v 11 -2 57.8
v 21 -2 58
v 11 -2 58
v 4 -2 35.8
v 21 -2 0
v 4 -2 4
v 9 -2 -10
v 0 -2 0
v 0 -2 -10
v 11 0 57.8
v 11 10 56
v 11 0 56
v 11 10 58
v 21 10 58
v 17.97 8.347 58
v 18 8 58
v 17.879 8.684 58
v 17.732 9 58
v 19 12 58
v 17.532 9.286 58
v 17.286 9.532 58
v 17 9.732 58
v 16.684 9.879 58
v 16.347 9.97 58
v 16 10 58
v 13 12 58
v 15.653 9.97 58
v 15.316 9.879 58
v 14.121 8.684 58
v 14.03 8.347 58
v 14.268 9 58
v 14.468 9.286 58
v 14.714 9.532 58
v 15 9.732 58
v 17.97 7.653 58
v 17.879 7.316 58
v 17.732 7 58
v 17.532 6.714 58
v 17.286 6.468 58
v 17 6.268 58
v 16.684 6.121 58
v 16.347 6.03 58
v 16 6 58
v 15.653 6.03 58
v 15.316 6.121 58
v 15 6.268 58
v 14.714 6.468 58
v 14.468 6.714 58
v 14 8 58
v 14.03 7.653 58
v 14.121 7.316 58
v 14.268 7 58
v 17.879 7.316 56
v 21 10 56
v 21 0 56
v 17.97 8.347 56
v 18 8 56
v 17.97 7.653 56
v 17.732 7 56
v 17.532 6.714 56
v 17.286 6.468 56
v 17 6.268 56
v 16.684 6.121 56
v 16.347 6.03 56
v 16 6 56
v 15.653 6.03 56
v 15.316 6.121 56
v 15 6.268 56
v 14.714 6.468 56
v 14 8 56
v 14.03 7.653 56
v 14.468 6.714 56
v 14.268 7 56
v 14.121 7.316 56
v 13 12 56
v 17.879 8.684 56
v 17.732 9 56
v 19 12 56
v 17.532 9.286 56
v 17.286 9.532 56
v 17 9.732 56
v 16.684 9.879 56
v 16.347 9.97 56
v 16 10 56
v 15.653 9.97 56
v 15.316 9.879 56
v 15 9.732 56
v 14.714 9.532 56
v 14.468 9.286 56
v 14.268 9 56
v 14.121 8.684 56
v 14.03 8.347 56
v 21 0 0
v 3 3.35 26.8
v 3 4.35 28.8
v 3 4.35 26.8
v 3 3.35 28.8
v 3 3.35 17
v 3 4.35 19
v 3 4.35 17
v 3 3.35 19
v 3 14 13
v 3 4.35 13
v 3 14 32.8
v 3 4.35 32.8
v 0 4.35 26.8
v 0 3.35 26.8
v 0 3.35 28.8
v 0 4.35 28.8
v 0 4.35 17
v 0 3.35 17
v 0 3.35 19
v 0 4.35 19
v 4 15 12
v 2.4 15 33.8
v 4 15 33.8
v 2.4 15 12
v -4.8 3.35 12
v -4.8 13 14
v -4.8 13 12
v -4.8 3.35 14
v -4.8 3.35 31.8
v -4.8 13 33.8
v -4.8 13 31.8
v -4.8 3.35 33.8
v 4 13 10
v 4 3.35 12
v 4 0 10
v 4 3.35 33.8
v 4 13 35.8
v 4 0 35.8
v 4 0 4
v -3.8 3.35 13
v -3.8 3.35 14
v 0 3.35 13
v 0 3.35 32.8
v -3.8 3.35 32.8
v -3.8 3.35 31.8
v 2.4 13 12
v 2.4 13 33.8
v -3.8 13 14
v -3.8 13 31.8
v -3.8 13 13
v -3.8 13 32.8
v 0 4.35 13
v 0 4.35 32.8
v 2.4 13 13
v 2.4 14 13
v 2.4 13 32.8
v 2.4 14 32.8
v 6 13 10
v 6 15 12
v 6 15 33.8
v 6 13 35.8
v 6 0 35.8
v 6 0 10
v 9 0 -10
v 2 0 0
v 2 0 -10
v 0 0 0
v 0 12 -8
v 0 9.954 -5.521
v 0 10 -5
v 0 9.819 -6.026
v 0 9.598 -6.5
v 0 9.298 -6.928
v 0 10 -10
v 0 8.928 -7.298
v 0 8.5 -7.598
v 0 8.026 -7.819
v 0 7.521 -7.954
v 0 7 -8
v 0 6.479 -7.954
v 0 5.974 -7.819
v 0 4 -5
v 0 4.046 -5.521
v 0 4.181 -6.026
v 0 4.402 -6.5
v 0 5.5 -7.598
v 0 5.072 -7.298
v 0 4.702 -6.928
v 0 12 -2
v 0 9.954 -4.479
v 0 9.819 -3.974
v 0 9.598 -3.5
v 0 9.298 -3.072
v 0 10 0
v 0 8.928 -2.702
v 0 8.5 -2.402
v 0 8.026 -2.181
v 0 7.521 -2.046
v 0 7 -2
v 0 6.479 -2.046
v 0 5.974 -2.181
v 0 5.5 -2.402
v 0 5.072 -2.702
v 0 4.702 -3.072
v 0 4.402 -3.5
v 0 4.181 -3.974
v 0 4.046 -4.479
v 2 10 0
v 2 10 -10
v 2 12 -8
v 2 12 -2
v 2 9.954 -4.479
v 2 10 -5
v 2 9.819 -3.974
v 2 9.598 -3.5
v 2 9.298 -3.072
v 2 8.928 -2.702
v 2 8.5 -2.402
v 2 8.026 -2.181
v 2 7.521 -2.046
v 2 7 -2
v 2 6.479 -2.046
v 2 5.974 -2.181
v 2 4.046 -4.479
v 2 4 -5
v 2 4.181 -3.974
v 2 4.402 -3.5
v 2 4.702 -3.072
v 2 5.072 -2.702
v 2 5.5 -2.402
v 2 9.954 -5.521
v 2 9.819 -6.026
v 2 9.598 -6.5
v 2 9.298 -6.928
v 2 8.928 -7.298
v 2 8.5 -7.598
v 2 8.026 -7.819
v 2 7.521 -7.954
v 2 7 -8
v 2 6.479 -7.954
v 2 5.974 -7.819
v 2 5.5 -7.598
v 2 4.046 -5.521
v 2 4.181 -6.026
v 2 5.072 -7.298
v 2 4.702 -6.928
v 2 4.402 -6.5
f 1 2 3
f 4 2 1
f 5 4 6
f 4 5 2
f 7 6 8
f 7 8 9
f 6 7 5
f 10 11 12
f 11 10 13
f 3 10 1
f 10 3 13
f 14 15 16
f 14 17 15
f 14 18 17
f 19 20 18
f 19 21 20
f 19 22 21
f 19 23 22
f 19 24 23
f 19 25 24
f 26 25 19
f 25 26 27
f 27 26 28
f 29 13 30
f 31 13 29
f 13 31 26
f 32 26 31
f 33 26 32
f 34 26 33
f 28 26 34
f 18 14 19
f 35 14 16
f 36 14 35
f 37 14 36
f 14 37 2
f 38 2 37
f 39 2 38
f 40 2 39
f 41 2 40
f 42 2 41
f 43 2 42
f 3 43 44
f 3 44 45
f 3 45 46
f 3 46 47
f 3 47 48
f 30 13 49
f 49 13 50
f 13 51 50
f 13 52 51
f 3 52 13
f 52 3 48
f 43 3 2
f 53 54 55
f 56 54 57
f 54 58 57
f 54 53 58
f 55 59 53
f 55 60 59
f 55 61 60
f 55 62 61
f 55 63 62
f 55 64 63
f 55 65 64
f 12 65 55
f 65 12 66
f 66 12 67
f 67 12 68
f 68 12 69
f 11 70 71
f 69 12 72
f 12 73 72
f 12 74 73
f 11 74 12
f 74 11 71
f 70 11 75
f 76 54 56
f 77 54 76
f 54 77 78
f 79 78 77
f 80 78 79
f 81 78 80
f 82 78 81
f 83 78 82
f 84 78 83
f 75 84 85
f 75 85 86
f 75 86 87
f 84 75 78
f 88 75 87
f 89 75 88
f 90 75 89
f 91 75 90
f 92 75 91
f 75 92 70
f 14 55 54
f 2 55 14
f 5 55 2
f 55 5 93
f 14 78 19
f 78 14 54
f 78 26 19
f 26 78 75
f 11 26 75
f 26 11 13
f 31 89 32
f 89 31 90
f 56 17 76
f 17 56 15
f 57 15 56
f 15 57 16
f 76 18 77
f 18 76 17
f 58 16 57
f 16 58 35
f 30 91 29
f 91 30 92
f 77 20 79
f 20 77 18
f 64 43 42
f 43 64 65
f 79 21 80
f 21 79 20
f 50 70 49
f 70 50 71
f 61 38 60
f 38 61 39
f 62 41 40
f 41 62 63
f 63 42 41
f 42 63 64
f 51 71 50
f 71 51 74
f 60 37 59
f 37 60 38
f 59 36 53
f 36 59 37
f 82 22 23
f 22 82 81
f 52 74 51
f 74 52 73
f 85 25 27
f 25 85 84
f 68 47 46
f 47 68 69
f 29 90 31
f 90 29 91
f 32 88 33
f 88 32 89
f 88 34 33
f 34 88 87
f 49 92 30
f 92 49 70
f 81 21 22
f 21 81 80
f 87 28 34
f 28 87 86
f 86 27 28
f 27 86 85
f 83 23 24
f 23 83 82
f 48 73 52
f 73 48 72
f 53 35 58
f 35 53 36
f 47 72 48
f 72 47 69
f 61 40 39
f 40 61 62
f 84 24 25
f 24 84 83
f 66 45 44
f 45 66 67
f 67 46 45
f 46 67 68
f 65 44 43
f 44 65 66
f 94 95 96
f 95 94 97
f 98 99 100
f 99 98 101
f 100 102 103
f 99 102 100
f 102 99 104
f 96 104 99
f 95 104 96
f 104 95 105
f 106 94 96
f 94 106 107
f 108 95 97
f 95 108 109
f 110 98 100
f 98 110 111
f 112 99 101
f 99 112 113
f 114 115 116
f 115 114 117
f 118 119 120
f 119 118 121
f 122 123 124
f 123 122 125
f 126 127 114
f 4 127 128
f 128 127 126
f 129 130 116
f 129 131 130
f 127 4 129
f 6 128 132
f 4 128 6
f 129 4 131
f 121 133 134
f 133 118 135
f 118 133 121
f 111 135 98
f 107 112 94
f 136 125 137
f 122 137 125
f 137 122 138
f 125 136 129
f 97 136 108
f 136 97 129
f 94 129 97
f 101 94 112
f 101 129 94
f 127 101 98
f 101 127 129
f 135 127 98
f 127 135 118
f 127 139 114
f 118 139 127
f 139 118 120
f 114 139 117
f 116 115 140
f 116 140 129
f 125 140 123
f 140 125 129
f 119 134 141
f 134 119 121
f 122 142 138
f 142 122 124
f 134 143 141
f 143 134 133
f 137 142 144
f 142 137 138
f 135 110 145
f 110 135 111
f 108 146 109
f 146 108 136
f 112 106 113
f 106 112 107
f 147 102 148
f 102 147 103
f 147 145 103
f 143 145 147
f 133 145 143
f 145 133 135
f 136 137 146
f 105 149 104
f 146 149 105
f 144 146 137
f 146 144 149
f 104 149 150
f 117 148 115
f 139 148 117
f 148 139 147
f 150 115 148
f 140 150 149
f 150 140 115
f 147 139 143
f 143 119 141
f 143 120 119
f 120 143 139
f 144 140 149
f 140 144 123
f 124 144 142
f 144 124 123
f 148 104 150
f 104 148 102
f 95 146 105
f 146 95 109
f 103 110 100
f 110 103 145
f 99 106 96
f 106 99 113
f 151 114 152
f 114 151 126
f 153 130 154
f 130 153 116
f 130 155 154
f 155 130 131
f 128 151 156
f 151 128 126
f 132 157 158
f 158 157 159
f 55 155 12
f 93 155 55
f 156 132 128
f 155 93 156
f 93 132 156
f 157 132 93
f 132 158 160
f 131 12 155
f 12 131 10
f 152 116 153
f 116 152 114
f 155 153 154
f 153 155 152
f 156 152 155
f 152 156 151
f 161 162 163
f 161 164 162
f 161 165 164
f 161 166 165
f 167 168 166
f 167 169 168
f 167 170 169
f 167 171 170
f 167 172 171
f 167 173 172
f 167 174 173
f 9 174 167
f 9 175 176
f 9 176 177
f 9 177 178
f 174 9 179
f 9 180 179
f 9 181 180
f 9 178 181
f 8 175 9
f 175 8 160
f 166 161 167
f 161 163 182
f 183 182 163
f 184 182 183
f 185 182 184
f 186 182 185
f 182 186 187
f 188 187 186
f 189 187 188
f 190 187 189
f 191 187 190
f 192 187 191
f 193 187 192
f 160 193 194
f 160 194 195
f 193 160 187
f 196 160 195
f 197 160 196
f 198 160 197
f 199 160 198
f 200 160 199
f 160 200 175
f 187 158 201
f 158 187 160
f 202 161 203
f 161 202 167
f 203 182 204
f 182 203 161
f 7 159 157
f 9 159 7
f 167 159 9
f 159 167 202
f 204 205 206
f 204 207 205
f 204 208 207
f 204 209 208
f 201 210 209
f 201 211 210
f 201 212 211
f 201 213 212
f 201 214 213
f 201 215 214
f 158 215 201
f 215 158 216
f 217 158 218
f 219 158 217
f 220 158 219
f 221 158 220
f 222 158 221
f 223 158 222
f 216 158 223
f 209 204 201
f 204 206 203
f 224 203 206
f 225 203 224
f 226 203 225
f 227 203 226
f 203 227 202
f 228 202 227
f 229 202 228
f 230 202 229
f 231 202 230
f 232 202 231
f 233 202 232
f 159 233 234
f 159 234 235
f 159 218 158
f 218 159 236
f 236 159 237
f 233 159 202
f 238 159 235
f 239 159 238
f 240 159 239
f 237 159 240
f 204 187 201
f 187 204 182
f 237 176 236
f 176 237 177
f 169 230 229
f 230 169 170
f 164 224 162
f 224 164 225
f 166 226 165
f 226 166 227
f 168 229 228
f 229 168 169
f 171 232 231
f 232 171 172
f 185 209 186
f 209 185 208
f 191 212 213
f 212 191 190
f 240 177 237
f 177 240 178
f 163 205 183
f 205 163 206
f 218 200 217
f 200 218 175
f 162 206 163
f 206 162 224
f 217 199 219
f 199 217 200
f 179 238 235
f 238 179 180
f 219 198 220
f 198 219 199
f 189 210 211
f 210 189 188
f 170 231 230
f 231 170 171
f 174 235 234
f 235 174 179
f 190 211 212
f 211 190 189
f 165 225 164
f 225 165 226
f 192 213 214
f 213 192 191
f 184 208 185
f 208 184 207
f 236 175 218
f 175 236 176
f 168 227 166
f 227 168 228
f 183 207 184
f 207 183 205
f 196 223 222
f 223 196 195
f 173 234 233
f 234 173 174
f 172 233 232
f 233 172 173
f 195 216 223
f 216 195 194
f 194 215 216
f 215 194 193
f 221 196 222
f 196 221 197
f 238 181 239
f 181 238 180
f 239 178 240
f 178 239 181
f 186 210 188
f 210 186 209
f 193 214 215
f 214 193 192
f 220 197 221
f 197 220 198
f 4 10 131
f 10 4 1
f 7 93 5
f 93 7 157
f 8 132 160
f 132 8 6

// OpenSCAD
// file: endstop_holder.scad
module holder(switch_x, switch_y, switch_z) {

  difference() {
    cube([switch_x + 2, switch_y + 2, switch_z + 2], false);

    // cut top
    translate([-1, 2, switch_z])
      cube([switch_x + 2, switch_y - 2, 3], false);

    // cut lower back edge
    translate([-1, 1, 4])
      cube([3, switch_y, switch_z - 3], false);

    // cut lower front edge
    translate([switch_x, -1, 1.6])
      cube([switch_x, switch_y + 4, switch_z + 4], false);

    // cut jags
    for (y = [5, switch_y - 5])
      translate([-1, y, 1])
        cube([3, 2, 10], false);

    // cut switch
    translate([1, 1, 1])
      cube([switch_x, switch_y, switch_z], false);
  }

}

holder(9.65, 19.8, 6.8);
// main file
use <endstop_holder.scad>;

switch_x = 9.65;
switch_y = 19.8;
switch_z = 6.8;

bracket_height = 12;
holder_overhang = 20 - switch_x - 2;

screw_z_diameter = 4;
screw_x_diameter = 6;

color("yellow", 0.5)
translate([4, -2, 14 + switch_y])
hull() {
  cube([17, 2, 2], false);
  translate([7, 0, 22])
    cube([10, 2, 2], false);
}

color("red", 0.5)
translate([4, -2, - 4 - screw_x_diameter])
hull() {
  cube([5, 2, 26 + switch_y], false);
  translate([12, 0, 10])
    cube([5, 2, 26 + switch_y - 10], false);
}

color("orange", 0.5)
translate([0, -2, - 4 - screw_x_diameter])
hull() {
  cube([1, 2, 4 + screw_x_diameter], false);
  translate([4, 0, 0])
    cube([1, 2, 4 + screw_x_diameter + 4], false);
}

color("purple", 0.5)
difference() {
  translate([11, -2, 56])
  hull() {
    cube([10, 6 + 1.5 * screw_z_diameter, 2], false);
    translate([2, 0, 0])
      cube([6, 6 + 1.5 * screw_z_diameter + 2, 2], false);
  }

  color("blue", 0.5)
  translate([16, 6 + screw_z_diameter / 2, 56 - 2])
    cylinder(6, d = screw_z_diameter, $fn = 36);
}


color("green", 0.5)
translate([4, 0, 10])
union() {
  hull() {
    cube([2, 15 - 2, switch_y + 6], false);
    translate([0, 0, 2])
      cube([2, 15, switch_y + 2], false);
  }

  translate([0, 15 - (switch_x + 2), switch_y + 4])
  rotate([-90, 0, 90])
    holder(switch_x, switch_y, switch_z);
}

color("blue", 0.5)
difference() {
  translate([0, 0, - 4 - screw_x_diameter])
  hull() {
    cube([2, 4 + screw_x_diameter, 4 + screw_x_diameter], false);
    translate([0, 0, 2])
      cube([2, 6 + screw_x_diameter, 6], false);
  }

  translate([-2, 7, - 2 -screw_x_diameter / 2])
  rotate([0, 90, 0])
    cylinder(6, d = screw_x_diameter, $fn = 36);
}
